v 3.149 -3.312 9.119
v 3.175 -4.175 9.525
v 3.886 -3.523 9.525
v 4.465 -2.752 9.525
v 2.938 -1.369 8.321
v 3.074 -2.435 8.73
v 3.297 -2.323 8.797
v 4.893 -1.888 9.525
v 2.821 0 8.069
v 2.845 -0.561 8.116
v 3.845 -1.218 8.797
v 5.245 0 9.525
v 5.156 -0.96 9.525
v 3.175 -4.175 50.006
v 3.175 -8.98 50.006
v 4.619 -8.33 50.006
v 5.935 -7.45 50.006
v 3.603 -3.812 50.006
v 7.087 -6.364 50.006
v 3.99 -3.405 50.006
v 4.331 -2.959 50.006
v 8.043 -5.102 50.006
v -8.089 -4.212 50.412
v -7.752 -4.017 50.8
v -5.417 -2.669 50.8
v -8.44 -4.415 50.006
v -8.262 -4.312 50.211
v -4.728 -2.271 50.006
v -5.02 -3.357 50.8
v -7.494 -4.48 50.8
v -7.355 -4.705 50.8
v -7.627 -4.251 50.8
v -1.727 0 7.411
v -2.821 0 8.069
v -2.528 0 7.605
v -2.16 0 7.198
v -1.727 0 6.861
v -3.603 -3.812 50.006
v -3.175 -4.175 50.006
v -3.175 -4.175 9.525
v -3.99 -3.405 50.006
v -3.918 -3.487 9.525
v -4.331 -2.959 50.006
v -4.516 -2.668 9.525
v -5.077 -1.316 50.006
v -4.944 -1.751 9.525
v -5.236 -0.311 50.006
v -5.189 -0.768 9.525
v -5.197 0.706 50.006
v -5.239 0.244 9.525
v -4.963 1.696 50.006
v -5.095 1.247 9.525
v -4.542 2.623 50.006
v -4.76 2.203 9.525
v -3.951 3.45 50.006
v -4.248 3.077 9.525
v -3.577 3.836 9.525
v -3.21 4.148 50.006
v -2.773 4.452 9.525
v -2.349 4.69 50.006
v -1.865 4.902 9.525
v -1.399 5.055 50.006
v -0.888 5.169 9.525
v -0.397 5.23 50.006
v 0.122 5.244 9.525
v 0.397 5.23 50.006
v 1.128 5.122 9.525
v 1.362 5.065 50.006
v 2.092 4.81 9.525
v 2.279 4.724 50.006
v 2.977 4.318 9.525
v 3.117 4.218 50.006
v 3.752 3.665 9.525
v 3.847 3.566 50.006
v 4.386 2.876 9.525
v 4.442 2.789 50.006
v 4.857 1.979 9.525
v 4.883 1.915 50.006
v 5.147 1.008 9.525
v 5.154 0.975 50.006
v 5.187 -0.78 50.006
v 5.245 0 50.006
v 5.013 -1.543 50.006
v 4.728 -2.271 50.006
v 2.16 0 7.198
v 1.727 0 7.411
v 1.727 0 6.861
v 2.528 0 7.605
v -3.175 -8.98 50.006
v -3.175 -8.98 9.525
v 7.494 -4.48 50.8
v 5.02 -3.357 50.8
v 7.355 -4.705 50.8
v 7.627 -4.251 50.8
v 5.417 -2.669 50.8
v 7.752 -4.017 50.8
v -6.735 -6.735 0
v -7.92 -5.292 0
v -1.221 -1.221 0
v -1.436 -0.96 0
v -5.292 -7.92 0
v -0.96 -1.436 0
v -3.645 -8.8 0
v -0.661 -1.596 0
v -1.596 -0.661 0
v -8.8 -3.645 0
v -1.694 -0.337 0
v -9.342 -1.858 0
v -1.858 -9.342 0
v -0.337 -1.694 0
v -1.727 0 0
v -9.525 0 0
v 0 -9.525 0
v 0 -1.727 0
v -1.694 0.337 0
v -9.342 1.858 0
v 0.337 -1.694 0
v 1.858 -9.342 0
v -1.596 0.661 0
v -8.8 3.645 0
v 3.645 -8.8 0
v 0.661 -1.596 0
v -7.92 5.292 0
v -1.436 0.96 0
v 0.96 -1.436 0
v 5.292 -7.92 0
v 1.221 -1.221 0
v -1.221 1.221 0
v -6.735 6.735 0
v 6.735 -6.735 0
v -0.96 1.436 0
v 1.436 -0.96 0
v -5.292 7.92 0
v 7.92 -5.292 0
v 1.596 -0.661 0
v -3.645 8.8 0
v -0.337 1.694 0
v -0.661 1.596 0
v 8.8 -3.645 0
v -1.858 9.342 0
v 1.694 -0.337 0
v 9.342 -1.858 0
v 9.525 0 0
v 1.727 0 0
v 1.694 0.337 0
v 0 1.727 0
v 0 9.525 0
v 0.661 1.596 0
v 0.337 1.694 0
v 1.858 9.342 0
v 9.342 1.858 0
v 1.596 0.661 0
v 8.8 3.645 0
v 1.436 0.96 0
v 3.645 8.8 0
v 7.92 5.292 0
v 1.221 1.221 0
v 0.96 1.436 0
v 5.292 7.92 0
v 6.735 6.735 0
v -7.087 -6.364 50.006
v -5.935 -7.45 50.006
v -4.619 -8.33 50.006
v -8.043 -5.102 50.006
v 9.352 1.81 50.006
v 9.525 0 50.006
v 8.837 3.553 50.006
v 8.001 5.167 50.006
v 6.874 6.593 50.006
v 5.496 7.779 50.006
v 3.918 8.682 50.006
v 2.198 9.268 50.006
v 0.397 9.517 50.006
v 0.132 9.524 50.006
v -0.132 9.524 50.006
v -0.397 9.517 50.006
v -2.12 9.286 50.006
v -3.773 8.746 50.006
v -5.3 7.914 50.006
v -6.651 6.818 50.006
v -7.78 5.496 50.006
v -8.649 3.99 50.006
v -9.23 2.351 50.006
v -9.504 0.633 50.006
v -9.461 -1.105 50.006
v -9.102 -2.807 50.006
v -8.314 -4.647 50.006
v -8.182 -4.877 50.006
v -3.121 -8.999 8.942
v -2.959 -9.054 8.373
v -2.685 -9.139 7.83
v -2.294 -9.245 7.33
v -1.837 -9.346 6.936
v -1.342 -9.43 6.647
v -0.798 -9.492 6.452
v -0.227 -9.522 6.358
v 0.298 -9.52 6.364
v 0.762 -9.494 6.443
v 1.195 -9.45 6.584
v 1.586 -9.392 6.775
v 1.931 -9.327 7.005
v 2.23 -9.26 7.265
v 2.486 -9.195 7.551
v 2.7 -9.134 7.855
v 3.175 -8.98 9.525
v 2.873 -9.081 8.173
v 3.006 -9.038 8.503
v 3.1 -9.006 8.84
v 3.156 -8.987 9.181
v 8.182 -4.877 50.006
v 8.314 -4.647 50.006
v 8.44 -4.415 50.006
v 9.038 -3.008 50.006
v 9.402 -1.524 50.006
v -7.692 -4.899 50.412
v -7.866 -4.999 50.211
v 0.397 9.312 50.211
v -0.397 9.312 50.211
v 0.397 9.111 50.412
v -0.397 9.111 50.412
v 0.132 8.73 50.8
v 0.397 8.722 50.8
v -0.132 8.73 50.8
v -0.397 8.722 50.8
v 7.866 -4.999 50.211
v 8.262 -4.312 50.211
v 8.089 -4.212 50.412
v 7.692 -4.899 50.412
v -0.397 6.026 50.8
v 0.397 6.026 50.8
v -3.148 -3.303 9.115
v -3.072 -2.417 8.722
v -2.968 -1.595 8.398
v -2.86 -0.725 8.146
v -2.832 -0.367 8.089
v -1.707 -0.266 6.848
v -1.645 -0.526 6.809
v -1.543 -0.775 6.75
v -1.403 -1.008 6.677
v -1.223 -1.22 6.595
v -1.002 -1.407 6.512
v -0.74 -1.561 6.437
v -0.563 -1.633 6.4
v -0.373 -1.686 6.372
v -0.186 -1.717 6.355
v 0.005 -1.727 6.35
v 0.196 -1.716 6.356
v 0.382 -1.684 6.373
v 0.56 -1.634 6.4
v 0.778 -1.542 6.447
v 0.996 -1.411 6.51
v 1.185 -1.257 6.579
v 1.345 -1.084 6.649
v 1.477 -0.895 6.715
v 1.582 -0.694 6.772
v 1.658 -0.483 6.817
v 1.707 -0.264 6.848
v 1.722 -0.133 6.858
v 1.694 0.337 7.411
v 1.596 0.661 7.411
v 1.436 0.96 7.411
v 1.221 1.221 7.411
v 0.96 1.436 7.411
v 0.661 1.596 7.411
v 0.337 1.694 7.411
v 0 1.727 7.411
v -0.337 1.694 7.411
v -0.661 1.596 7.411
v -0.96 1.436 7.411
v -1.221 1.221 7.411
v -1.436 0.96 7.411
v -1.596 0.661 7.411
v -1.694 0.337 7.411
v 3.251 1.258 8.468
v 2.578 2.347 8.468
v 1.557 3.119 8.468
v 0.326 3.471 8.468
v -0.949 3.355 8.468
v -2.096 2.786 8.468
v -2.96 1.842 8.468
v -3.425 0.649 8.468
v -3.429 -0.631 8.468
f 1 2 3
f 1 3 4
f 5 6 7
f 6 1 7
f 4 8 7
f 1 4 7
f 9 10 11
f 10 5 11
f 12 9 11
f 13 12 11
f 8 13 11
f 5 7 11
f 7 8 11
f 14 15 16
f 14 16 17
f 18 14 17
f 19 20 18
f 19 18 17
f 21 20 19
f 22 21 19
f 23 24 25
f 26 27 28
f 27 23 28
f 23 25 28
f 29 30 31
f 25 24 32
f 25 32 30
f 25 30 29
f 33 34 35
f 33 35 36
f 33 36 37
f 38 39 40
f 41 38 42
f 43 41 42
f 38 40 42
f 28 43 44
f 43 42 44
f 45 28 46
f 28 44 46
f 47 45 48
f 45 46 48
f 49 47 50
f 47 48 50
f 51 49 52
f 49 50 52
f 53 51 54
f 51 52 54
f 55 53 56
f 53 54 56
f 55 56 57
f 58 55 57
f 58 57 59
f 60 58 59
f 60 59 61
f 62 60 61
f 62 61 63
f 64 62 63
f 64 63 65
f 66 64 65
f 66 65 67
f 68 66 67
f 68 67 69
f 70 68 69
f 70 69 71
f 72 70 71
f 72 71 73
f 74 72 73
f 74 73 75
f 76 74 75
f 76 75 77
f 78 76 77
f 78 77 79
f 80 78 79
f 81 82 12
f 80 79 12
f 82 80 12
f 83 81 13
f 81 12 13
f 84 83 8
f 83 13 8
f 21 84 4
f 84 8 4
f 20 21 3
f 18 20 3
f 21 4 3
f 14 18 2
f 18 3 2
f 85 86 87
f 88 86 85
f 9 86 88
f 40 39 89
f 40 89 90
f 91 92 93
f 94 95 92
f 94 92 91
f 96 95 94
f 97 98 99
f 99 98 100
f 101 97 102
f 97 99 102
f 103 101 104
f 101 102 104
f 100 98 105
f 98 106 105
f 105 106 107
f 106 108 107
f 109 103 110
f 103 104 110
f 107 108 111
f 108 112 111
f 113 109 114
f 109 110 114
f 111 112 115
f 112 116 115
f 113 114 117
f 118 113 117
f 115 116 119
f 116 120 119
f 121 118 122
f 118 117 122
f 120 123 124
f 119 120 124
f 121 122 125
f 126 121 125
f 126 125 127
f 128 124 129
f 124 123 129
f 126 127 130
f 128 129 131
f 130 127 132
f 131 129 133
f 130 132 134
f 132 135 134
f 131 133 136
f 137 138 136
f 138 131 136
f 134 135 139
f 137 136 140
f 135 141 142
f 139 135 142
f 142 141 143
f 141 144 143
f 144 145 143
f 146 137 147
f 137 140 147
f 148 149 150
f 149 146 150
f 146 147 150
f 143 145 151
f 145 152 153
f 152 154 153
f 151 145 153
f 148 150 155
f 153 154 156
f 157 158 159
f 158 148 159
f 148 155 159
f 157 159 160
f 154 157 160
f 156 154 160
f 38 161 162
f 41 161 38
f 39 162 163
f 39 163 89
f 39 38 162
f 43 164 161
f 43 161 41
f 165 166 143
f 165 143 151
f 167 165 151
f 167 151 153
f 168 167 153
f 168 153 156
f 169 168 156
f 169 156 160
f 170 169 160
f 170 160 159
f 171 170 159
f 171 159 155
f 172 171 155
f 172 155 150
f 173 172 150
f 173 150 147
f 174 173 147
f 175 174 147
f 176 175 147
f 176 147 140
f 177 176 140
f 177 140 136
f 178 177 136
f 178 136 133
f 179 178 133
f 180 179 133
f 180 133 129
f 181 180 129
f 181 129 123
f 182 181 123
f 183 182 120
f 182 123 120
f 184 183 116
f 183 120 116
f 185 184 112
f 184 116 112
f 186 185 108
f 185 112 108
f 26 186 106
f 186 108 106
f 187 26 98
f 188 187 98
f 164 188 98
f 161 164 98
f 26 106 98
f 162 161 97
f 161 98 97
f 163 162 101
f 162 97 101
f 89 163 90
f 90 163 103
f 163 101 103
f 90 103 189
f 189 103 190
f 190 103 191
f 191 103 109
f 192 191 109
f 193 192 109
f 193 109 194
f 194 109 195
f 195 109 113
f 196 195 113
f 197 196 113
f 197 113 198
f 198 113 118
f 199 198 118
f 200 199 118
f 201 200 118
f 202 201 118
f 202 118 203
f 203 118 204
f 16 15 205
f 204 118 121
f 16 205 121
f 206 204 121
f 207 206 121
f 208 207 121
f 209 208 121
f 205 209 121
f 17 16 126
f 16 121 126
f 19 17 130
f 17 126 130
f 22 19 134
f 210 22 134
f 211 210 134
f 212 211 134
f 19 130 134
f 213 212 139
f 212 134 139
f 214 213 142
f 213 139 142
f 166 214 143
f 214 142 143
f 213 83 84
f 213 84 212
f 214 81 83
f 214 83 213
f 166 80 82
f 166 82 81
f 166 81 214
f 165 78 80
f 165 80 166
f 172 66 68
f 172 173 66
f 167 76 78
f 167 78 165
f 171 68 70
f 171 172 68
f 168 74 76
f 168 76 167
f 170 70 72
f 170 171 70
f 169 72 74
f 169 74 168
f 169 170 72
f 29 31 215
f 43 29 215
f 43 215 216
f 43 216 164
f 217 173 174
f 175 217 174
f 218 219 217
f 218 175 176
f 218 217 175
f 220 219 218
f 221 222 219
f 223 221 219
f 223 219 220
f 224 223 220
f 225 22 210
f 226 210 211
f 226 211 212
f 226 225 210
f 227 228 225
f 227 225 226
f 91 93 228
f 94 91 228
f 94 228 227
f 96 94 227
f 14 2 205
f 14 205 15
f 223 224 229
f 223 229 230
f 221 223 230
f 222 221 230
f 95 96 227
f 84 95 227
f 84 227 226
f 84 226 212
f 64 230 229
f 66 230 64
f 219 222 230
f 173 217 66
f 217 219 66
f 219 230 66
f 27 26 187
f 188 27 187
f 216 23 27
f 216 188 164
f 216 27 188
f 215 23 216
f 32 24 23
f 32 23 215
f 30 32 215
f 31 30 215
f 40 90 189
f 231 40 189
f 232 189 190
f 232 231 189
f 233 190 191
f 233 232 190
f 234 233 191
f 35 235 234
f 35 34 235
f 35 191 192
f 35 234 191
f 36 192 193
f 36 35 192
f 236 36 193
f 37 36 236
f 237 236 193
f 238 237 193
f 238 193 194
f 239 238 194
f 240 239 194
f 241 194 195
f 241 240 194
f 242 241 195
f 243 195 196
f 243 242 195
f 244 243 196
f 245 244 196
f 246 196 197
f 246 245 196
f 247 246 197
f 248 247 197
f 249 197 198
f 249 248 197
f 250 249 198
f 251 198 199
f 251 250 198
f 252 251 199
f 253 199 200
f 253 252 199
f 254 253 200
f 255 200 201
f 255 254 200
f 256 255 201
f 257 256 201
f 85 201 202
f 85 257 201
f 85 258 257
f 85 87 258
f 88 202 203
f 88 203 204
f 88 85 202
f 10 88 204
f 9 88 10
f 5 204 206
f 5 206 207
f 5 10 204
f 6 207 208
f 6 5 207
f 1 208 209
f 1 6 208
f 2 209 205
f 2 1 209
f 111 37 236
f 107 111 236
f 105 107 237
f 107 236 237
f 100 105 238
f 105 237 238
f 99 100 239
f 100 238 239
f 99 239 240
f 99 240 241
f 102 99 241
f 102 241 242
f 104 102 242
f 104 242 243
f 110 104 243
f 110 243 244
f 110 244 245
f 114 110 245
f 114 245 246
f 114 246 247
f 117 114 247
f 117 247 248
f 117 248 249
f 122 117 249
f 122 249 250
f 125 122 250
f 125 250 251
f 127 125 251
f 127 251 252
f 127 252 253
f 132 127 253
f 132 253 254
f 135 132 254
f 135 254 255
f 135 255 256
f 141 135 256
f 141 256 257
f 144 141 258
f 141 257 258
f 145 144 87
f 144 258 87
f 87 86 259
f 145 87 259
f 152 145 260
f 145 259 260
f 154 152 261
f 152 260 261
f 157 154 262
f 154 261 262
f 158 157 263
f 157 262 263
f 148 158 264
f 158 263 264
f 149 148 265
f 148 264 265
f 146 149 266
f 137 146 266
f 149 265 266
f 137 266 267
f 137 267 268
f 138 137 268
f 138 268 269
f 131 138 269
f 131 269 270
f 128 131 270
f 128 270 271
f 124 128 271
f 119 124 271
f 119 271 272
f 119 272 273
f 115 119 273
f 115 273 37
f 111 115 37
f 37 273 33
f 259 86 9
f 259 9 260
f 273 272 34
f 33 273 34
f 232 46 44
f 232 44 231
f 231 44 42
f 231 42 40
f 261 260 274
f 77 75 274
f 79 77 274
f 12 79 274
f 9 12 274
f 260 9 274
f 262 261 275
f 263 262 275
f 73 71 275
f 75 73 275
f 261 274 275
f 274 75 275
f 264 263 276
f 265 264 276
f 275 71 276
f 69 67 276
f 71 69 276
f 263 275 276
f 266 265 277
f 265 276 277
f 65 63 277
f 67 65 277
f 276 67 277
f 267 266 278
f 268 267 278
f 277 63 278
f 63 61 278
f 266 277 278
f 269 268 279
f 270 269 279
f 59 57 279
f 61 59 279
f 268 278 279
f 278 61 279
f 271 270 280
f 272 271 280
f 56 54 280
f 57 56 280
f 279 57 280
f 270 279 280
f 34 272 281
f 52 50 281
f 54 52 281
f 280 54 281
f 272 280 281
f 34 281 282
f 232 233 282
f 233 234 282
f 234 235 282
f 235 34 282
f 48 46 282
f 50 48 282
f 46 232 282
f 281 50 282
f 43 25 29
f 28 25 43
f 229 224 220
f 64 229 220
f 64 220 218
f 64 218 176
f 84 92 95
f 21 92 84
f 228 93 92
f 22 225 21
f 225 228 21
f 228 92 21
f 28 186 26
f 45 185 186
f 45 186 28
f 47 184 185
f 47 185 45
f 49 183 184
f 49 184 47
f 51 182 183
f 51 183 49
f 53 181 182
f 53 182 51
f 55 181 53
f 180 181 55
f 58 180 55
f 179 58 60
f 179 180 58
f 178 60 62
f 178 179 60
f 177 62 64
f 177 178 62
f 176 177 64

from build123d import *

# Parameters (mm, degrees)
F0_R      = 9.525
F1_DEPTH  = 50.8
F3_D      = 10.4902
F3_DEPTH  = 41.275
F3_TIP    = 3.1515740329
F5_D      = 3.4544
F7_DEPTH  = 0.79375
F8_SIZE   = 0.79375
F10_DEPTH = 25.4


with BuildPart() as f1:
    # F0 (on Top) → F1 (new body)
    with BuildSketch(Plane.XY):
        Circle(F0_R)
    extrude(amount=F1_DEPTH)

    # F3
    with Locations(Plane.XY.offset(50.8)):
        with Locations((0, 0)):
            Hole(F3_D / 2, depth=F3_DEPTH)
            with Locations((0, 0, -(F3_DEPTH + F3_TIP / 2))):  # 118° drill point
                Cone(0, F3_D / 2, F3_TIP, mode=Mode.SUBTRACT)

    # F5 (through all)
    with Locations(Plane(origin=(0, 0, 0), x_dir=(1, 0, 0), z_dir=(0, 0, -1))):
        with Locations((0, 0)):
            Hole(F5_D / 2)

    # F6 (on face) → F7 (cut)
    with BuildSketch(Plane.XY.offset(50.8)):
        with BuildLine():
            ThreePointArc((-4.7278053569, -2.2713279193), (-4.5423898454, 2.62255), (-0.396875, 5.2300635029))
            Line((-0.396875, 5.2300635029), (-0.396875, 9.5167281791))
            ThreePointArc((-0.396875, 9.5167281791), (-8.248891971, 4.7625), (-8.440165864, -4.4146602574))
            Line((-8.440165864, -4.4146602574), (-4.7278053569, -2.2713279193))
        make_face()
        with BuildLine():
            Line((8.043290864, -5.1020679217), (4.3309303569, -2.9587355836))
            ThreePointArc((4.3309303569, -2.9587355836), (0, -5.2451), (-4.3309303569, -2.9587355836))
            Line((-4.3309303569, -2.9587355836), (-8.043290864, -5.1020679217))
            ThreePointArc((-8.043290864, -5.1020679217), (0, -9.525), (8.043290864, -5.1020679217))
        make_face()
        with BuildLine():
            ThreePointArc((0.396875, 5.2300635029), (3.8466038965, 3.5657695486), (5.2451, 0))
            ThreePointArc((5.2451, 0), (5.1141414669, -1.1647450649), (4.7278053569, -2.2713279193))
            Line((4.7278053569, -2.2713279193), (8.440165864, -4.4146602574))
            ThreePointArc((8.440165864, -4.4146602574), (9.2498163456, -2.2729985862), (9.525, 0))
            ThreePointArc((9.525, 0), (6.8740766425, 6.5933826912), (0.396875, 9.5167281791))
            Line((0.396875, 9.5167281791), (0.396875, 5.2300635029))
        make_face()
    extrude(amount=-F7_DEPTH, mode=Mode.SUBTRACT)

    # F8
    f8_edges = [f1.edges().sort_by_distance(p)[0] for p in [
        (8.248892, -4.7625, 50.8),
        (0, 9.525, 50.8),
        (-8.248892, -4.7625, 50.8),
        (4.54239, -2.62255, 50.8),
        (-4.54239, -2.62255, 50.8),
        (0, 5.2451, 50.8),
    ]]
    chamfer(f8_edges, length=F8_SIZE)

    # F9 (on Front) → F10 (cut)
    with BuildSketch(Plane.XZ):
        with BuildLine():
            ThreePointArc((3.175, 52.54625), (0, 55.72125), (-3.175, 52.54625))
            Line((-3.175, 52.54625), (-3.175, 9.525))
            ThreePointArc((-3.175, 9.525), (0, 6.35), (3.175, 9.525))
            Line((3.175, 9.525), (3.175, 52.54625))
        make_face()
    extrude(amount=F10_DEPTH, mode=Mode.SUBTRACT)


solid = f1.part
